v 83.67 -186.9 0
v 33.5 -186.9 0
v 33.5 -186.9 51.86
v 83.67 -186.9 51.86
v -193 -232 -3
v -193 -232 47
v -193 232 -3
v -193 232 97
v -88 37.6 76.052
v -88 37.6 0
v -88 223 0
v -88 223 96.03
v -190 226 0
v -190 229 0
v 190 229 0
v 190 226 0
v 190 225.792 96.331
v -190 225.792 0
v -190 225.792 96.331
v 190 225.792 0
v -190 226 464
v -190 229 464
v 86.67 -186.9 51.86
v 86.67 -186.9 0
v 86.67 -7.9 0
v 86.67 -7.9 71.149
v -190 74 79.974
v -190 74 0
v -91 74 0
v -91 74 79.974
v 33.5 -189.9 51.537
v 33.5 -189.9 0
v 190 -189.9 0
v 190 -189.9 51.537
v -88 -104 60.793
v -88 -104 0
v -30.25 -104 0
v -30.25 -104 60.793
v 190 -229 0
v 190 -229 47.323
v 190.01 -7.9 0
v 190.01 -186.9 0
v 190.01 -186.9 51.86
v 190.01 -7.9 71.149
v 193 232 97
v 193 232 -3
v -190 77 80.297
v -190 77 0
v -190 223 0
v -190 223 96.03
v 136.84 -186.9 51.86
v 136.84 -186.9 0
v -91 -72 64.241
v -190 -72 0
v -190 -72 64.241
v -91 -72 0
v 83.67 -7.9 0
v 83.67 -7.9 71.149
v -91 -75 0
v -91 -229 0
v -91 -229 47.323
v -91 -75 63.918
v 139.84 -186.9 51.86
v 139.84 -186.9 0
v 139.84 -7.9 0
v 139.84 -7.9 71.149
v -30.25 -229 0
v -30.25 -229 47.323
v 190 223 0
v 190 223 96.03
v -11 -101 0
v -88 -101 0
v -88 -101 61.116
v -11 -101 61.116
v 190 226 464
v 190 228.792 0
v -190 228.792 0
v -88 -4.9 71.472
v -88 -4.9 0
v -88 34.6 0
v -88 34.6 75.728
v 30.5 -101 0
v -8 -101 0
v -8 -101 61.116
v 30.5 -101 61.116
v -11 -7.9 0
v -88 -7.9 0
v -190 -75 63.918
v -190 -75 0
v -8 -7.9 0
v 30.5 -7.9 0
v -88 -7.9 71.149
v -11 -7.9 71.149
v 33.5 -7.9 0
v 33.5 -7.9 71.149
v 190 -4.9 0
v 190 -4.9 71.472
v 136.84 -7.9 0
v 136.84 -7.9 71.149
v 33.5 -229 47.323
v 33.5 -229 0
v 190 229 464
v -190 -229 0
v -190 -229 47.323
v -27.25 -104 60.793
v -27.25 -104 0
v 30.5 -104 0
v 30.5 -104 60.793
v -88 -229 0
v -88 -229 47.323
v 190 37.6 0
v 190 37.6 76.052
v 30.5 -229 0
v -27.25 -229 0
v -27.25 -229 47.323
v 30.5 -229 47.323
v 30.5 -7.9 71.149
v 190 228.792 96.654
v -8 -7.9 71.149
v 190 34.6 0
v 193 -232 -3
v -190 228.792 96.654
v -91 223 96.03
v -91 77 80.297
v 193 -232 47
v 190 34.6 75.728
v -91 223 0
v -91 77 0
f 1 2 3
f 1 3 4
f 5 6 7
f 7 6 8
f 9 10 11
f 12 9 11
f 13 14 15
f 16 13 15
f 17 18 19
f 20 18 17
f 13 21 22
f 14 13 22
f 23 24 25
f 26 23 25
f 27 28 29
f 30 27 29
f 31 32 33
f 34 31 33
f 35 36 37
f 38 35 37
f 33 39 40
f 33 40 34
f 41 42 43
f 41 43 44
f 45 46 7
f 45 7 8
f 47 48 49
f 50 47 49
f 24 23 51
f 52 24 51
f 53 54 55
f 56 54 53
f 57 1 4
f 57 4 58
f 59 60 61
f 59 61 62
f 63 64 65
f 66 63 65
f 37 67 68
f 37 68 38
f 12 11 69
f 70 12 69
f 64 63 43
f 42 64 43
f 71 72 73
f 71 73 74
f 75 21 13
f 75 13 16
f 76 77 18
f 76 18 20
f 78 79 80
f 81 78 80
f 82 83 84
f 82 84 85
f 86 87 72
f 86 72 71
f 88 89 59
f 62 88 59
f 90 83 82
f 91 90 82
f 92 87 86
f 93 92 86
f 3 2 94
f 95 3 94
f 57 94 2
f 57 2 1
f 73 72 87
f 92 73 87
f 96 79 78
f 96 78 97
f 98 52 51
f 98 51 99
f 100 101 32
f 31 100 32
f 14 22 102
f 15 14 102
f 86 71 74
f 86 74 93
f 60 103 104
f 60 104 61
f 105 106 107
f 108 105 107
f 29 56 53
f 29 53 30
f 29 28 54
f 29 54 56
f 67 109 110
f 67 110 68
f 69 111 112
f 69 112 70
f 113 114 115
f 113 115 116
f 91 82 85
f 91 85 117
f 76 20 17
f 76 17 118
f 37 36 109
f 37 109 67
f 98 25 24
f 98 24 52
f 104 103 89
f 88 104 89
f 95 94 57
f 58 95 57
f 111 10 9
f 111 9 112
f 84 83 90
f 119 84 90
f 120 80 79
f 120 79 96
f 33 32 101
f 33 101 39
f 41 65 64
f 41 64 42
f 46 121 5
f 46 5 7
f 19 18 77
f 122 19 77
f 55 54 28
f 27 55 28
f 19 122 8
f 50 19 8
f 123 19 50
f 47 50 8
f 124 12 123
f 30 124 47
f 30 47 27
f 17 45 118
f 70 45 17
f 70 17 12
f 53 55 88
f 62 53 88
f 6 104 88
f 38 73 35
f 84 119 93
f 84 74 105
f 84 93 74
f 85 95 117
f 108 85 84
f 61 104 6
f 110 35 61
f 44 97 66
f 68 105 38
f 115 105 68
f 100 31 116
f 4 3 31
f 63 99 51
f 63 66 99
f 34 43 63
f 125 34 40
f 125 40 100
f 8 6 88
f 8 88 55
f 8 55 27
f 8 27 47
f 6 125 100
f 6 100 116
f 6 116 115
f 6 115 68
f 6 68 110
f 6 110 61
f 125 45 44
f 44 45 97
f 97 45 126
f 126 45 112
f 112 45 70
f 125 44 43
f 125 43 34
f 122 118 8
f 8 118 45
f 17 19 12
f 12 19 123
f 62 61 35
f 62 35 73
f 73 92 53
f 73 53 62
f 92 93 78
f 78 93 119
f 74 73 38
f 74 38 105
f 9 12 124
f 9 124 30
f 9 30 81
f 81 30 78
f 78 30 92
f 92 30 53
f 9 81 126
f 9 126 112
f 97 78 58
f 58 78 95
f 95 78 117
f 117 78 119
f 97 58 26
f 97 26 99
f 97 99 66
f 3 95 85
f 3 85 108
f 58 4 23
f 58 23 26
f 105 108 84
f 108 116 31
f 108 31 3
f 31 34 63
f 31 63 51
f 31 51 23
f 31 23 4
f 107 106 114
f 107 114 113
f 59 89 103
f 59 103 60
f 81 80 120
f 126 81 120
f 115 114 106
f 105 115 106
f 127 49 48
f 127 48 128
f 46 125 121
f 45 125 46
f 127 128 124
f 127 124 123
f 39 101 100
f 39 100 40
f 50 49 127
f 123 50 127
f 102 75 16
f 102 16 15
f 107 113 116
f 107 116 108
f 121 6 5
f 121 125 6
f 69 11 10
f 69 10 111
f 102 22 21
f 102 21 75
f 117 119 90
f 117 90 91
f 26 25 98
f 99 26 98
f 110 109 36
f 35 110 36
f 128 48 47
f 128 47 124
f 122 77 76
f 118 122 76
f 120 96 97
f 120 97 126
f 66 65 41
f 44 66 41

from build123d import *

# Parameters (mm, degrees)
PAD_DEPTH     = 193
SKETCH001_W   = 99
SKETCH001_H   = 146
SKETCH001_H_2 = 154
SKETCH001_W_2 = 380
SKETCH001_H_3 = 3
SKETCH001_W_3 = 278
SKETCH001_H_4 = 185.4
SKETCH001_H_5 = 39.5
SKETCH001_W_4 = 77
SKETCH001_H_6 = 93.1
SKETCH001_W_5 = 38.5
SKETCH001_W_6 = 57.75
SKETCH001_H_7 = 125
SKETCH001_W_7 = 50.17
SKETCH001_H_8 = 179
SKETCH001_W_8 = 156.5
SKETCH001_H_9 = 39.1
POCKET_DEPTH  = 100
SKETCH002_W   = 380
SKETCH002_H   = 3
PAD001_DEPTH  = 464


with BuildPart() as base_expositor:
    # Sketch → Pad (new body, symmetric)
    with BuildSketch(Plane.YZ):
        Polygon((-232, 47), (-232, -3), (232, -3), (232, 97), align=None)
    extrude(amount=PAD_DEPTH, both=True)

    # Sketch001 → Pocket (cut)
    with BuildSketch(Plane.XY):
        with Locations((-140.5, 150)):
            Rectangle(SKETCH001_W, SKETCH001_H)
        with Locations((-140.5, 1)):
            Rectangle(SKETCH001_W, SKETCH001_H)
        with Locations((-140.5, -152)):
            Rectangle(SKETCH001_W, SKETCH001_H_2)
        with Locations((0, 227.291516)):
            Rectangle(SKETCH001_W_2, SKETCH001_H_3)
        with Locations((51, 130.3)):
            Rectangle(SKETCH001_W_3, SKETCH001_H_4)
        with Locations((51, 14.85)):
            Rectangle(SKETCH001_W_3, SKETCH001_H_5)
        with Locations((-49.5, -54.45)):
            Rectangle(SKETCH001_W_4, SKETCH001_H_6)
        with Locations((11.25, -54.45)):
            Rectangle(SKETCH001_W_5, SKETCH001_H_6)
        with Locations((-59.125, -166.5)):
            Rectangle(SKETCH001_W_6, SKETCH001_H_7)
        with Locations((1.625, -166.5)):
            Rectangle(SKETCH001_W_6, SKETCH001_H_7)
        with Locations((58.585, -97.4)):
            Rectangle(SKETCH001_W_7, SKETCH001_H_8)
        with Locations((111.755, -97.4)):
            Rectangle(SKETCH001_W_7, SKETCH001_H_8)
        with Locations((164.925, -97.4)):
            Rectangle(SKETCH001_W_7, SKETCH001_H_8)
        with Locations((111.75, -209.45)):
            Rectangle(SKETCH001_W_8, SKETCH001_H_9)
    extrude(amount=POCKET_DEPTH, mode=Mode.SUBTRACT)


with BuildPart() as panel_expositor:
    # Sketch002 → Pad001 (new body)
    with BuildSketch(Plane.XY):
        with Locations((0, 227.5)):
            Rectangle(SKETCH002_W, SKETCH002_H)
    extrude(amount=PAD001_DEPTH)


solid = Compound([base_expositor.part, panel_expositor.part])
